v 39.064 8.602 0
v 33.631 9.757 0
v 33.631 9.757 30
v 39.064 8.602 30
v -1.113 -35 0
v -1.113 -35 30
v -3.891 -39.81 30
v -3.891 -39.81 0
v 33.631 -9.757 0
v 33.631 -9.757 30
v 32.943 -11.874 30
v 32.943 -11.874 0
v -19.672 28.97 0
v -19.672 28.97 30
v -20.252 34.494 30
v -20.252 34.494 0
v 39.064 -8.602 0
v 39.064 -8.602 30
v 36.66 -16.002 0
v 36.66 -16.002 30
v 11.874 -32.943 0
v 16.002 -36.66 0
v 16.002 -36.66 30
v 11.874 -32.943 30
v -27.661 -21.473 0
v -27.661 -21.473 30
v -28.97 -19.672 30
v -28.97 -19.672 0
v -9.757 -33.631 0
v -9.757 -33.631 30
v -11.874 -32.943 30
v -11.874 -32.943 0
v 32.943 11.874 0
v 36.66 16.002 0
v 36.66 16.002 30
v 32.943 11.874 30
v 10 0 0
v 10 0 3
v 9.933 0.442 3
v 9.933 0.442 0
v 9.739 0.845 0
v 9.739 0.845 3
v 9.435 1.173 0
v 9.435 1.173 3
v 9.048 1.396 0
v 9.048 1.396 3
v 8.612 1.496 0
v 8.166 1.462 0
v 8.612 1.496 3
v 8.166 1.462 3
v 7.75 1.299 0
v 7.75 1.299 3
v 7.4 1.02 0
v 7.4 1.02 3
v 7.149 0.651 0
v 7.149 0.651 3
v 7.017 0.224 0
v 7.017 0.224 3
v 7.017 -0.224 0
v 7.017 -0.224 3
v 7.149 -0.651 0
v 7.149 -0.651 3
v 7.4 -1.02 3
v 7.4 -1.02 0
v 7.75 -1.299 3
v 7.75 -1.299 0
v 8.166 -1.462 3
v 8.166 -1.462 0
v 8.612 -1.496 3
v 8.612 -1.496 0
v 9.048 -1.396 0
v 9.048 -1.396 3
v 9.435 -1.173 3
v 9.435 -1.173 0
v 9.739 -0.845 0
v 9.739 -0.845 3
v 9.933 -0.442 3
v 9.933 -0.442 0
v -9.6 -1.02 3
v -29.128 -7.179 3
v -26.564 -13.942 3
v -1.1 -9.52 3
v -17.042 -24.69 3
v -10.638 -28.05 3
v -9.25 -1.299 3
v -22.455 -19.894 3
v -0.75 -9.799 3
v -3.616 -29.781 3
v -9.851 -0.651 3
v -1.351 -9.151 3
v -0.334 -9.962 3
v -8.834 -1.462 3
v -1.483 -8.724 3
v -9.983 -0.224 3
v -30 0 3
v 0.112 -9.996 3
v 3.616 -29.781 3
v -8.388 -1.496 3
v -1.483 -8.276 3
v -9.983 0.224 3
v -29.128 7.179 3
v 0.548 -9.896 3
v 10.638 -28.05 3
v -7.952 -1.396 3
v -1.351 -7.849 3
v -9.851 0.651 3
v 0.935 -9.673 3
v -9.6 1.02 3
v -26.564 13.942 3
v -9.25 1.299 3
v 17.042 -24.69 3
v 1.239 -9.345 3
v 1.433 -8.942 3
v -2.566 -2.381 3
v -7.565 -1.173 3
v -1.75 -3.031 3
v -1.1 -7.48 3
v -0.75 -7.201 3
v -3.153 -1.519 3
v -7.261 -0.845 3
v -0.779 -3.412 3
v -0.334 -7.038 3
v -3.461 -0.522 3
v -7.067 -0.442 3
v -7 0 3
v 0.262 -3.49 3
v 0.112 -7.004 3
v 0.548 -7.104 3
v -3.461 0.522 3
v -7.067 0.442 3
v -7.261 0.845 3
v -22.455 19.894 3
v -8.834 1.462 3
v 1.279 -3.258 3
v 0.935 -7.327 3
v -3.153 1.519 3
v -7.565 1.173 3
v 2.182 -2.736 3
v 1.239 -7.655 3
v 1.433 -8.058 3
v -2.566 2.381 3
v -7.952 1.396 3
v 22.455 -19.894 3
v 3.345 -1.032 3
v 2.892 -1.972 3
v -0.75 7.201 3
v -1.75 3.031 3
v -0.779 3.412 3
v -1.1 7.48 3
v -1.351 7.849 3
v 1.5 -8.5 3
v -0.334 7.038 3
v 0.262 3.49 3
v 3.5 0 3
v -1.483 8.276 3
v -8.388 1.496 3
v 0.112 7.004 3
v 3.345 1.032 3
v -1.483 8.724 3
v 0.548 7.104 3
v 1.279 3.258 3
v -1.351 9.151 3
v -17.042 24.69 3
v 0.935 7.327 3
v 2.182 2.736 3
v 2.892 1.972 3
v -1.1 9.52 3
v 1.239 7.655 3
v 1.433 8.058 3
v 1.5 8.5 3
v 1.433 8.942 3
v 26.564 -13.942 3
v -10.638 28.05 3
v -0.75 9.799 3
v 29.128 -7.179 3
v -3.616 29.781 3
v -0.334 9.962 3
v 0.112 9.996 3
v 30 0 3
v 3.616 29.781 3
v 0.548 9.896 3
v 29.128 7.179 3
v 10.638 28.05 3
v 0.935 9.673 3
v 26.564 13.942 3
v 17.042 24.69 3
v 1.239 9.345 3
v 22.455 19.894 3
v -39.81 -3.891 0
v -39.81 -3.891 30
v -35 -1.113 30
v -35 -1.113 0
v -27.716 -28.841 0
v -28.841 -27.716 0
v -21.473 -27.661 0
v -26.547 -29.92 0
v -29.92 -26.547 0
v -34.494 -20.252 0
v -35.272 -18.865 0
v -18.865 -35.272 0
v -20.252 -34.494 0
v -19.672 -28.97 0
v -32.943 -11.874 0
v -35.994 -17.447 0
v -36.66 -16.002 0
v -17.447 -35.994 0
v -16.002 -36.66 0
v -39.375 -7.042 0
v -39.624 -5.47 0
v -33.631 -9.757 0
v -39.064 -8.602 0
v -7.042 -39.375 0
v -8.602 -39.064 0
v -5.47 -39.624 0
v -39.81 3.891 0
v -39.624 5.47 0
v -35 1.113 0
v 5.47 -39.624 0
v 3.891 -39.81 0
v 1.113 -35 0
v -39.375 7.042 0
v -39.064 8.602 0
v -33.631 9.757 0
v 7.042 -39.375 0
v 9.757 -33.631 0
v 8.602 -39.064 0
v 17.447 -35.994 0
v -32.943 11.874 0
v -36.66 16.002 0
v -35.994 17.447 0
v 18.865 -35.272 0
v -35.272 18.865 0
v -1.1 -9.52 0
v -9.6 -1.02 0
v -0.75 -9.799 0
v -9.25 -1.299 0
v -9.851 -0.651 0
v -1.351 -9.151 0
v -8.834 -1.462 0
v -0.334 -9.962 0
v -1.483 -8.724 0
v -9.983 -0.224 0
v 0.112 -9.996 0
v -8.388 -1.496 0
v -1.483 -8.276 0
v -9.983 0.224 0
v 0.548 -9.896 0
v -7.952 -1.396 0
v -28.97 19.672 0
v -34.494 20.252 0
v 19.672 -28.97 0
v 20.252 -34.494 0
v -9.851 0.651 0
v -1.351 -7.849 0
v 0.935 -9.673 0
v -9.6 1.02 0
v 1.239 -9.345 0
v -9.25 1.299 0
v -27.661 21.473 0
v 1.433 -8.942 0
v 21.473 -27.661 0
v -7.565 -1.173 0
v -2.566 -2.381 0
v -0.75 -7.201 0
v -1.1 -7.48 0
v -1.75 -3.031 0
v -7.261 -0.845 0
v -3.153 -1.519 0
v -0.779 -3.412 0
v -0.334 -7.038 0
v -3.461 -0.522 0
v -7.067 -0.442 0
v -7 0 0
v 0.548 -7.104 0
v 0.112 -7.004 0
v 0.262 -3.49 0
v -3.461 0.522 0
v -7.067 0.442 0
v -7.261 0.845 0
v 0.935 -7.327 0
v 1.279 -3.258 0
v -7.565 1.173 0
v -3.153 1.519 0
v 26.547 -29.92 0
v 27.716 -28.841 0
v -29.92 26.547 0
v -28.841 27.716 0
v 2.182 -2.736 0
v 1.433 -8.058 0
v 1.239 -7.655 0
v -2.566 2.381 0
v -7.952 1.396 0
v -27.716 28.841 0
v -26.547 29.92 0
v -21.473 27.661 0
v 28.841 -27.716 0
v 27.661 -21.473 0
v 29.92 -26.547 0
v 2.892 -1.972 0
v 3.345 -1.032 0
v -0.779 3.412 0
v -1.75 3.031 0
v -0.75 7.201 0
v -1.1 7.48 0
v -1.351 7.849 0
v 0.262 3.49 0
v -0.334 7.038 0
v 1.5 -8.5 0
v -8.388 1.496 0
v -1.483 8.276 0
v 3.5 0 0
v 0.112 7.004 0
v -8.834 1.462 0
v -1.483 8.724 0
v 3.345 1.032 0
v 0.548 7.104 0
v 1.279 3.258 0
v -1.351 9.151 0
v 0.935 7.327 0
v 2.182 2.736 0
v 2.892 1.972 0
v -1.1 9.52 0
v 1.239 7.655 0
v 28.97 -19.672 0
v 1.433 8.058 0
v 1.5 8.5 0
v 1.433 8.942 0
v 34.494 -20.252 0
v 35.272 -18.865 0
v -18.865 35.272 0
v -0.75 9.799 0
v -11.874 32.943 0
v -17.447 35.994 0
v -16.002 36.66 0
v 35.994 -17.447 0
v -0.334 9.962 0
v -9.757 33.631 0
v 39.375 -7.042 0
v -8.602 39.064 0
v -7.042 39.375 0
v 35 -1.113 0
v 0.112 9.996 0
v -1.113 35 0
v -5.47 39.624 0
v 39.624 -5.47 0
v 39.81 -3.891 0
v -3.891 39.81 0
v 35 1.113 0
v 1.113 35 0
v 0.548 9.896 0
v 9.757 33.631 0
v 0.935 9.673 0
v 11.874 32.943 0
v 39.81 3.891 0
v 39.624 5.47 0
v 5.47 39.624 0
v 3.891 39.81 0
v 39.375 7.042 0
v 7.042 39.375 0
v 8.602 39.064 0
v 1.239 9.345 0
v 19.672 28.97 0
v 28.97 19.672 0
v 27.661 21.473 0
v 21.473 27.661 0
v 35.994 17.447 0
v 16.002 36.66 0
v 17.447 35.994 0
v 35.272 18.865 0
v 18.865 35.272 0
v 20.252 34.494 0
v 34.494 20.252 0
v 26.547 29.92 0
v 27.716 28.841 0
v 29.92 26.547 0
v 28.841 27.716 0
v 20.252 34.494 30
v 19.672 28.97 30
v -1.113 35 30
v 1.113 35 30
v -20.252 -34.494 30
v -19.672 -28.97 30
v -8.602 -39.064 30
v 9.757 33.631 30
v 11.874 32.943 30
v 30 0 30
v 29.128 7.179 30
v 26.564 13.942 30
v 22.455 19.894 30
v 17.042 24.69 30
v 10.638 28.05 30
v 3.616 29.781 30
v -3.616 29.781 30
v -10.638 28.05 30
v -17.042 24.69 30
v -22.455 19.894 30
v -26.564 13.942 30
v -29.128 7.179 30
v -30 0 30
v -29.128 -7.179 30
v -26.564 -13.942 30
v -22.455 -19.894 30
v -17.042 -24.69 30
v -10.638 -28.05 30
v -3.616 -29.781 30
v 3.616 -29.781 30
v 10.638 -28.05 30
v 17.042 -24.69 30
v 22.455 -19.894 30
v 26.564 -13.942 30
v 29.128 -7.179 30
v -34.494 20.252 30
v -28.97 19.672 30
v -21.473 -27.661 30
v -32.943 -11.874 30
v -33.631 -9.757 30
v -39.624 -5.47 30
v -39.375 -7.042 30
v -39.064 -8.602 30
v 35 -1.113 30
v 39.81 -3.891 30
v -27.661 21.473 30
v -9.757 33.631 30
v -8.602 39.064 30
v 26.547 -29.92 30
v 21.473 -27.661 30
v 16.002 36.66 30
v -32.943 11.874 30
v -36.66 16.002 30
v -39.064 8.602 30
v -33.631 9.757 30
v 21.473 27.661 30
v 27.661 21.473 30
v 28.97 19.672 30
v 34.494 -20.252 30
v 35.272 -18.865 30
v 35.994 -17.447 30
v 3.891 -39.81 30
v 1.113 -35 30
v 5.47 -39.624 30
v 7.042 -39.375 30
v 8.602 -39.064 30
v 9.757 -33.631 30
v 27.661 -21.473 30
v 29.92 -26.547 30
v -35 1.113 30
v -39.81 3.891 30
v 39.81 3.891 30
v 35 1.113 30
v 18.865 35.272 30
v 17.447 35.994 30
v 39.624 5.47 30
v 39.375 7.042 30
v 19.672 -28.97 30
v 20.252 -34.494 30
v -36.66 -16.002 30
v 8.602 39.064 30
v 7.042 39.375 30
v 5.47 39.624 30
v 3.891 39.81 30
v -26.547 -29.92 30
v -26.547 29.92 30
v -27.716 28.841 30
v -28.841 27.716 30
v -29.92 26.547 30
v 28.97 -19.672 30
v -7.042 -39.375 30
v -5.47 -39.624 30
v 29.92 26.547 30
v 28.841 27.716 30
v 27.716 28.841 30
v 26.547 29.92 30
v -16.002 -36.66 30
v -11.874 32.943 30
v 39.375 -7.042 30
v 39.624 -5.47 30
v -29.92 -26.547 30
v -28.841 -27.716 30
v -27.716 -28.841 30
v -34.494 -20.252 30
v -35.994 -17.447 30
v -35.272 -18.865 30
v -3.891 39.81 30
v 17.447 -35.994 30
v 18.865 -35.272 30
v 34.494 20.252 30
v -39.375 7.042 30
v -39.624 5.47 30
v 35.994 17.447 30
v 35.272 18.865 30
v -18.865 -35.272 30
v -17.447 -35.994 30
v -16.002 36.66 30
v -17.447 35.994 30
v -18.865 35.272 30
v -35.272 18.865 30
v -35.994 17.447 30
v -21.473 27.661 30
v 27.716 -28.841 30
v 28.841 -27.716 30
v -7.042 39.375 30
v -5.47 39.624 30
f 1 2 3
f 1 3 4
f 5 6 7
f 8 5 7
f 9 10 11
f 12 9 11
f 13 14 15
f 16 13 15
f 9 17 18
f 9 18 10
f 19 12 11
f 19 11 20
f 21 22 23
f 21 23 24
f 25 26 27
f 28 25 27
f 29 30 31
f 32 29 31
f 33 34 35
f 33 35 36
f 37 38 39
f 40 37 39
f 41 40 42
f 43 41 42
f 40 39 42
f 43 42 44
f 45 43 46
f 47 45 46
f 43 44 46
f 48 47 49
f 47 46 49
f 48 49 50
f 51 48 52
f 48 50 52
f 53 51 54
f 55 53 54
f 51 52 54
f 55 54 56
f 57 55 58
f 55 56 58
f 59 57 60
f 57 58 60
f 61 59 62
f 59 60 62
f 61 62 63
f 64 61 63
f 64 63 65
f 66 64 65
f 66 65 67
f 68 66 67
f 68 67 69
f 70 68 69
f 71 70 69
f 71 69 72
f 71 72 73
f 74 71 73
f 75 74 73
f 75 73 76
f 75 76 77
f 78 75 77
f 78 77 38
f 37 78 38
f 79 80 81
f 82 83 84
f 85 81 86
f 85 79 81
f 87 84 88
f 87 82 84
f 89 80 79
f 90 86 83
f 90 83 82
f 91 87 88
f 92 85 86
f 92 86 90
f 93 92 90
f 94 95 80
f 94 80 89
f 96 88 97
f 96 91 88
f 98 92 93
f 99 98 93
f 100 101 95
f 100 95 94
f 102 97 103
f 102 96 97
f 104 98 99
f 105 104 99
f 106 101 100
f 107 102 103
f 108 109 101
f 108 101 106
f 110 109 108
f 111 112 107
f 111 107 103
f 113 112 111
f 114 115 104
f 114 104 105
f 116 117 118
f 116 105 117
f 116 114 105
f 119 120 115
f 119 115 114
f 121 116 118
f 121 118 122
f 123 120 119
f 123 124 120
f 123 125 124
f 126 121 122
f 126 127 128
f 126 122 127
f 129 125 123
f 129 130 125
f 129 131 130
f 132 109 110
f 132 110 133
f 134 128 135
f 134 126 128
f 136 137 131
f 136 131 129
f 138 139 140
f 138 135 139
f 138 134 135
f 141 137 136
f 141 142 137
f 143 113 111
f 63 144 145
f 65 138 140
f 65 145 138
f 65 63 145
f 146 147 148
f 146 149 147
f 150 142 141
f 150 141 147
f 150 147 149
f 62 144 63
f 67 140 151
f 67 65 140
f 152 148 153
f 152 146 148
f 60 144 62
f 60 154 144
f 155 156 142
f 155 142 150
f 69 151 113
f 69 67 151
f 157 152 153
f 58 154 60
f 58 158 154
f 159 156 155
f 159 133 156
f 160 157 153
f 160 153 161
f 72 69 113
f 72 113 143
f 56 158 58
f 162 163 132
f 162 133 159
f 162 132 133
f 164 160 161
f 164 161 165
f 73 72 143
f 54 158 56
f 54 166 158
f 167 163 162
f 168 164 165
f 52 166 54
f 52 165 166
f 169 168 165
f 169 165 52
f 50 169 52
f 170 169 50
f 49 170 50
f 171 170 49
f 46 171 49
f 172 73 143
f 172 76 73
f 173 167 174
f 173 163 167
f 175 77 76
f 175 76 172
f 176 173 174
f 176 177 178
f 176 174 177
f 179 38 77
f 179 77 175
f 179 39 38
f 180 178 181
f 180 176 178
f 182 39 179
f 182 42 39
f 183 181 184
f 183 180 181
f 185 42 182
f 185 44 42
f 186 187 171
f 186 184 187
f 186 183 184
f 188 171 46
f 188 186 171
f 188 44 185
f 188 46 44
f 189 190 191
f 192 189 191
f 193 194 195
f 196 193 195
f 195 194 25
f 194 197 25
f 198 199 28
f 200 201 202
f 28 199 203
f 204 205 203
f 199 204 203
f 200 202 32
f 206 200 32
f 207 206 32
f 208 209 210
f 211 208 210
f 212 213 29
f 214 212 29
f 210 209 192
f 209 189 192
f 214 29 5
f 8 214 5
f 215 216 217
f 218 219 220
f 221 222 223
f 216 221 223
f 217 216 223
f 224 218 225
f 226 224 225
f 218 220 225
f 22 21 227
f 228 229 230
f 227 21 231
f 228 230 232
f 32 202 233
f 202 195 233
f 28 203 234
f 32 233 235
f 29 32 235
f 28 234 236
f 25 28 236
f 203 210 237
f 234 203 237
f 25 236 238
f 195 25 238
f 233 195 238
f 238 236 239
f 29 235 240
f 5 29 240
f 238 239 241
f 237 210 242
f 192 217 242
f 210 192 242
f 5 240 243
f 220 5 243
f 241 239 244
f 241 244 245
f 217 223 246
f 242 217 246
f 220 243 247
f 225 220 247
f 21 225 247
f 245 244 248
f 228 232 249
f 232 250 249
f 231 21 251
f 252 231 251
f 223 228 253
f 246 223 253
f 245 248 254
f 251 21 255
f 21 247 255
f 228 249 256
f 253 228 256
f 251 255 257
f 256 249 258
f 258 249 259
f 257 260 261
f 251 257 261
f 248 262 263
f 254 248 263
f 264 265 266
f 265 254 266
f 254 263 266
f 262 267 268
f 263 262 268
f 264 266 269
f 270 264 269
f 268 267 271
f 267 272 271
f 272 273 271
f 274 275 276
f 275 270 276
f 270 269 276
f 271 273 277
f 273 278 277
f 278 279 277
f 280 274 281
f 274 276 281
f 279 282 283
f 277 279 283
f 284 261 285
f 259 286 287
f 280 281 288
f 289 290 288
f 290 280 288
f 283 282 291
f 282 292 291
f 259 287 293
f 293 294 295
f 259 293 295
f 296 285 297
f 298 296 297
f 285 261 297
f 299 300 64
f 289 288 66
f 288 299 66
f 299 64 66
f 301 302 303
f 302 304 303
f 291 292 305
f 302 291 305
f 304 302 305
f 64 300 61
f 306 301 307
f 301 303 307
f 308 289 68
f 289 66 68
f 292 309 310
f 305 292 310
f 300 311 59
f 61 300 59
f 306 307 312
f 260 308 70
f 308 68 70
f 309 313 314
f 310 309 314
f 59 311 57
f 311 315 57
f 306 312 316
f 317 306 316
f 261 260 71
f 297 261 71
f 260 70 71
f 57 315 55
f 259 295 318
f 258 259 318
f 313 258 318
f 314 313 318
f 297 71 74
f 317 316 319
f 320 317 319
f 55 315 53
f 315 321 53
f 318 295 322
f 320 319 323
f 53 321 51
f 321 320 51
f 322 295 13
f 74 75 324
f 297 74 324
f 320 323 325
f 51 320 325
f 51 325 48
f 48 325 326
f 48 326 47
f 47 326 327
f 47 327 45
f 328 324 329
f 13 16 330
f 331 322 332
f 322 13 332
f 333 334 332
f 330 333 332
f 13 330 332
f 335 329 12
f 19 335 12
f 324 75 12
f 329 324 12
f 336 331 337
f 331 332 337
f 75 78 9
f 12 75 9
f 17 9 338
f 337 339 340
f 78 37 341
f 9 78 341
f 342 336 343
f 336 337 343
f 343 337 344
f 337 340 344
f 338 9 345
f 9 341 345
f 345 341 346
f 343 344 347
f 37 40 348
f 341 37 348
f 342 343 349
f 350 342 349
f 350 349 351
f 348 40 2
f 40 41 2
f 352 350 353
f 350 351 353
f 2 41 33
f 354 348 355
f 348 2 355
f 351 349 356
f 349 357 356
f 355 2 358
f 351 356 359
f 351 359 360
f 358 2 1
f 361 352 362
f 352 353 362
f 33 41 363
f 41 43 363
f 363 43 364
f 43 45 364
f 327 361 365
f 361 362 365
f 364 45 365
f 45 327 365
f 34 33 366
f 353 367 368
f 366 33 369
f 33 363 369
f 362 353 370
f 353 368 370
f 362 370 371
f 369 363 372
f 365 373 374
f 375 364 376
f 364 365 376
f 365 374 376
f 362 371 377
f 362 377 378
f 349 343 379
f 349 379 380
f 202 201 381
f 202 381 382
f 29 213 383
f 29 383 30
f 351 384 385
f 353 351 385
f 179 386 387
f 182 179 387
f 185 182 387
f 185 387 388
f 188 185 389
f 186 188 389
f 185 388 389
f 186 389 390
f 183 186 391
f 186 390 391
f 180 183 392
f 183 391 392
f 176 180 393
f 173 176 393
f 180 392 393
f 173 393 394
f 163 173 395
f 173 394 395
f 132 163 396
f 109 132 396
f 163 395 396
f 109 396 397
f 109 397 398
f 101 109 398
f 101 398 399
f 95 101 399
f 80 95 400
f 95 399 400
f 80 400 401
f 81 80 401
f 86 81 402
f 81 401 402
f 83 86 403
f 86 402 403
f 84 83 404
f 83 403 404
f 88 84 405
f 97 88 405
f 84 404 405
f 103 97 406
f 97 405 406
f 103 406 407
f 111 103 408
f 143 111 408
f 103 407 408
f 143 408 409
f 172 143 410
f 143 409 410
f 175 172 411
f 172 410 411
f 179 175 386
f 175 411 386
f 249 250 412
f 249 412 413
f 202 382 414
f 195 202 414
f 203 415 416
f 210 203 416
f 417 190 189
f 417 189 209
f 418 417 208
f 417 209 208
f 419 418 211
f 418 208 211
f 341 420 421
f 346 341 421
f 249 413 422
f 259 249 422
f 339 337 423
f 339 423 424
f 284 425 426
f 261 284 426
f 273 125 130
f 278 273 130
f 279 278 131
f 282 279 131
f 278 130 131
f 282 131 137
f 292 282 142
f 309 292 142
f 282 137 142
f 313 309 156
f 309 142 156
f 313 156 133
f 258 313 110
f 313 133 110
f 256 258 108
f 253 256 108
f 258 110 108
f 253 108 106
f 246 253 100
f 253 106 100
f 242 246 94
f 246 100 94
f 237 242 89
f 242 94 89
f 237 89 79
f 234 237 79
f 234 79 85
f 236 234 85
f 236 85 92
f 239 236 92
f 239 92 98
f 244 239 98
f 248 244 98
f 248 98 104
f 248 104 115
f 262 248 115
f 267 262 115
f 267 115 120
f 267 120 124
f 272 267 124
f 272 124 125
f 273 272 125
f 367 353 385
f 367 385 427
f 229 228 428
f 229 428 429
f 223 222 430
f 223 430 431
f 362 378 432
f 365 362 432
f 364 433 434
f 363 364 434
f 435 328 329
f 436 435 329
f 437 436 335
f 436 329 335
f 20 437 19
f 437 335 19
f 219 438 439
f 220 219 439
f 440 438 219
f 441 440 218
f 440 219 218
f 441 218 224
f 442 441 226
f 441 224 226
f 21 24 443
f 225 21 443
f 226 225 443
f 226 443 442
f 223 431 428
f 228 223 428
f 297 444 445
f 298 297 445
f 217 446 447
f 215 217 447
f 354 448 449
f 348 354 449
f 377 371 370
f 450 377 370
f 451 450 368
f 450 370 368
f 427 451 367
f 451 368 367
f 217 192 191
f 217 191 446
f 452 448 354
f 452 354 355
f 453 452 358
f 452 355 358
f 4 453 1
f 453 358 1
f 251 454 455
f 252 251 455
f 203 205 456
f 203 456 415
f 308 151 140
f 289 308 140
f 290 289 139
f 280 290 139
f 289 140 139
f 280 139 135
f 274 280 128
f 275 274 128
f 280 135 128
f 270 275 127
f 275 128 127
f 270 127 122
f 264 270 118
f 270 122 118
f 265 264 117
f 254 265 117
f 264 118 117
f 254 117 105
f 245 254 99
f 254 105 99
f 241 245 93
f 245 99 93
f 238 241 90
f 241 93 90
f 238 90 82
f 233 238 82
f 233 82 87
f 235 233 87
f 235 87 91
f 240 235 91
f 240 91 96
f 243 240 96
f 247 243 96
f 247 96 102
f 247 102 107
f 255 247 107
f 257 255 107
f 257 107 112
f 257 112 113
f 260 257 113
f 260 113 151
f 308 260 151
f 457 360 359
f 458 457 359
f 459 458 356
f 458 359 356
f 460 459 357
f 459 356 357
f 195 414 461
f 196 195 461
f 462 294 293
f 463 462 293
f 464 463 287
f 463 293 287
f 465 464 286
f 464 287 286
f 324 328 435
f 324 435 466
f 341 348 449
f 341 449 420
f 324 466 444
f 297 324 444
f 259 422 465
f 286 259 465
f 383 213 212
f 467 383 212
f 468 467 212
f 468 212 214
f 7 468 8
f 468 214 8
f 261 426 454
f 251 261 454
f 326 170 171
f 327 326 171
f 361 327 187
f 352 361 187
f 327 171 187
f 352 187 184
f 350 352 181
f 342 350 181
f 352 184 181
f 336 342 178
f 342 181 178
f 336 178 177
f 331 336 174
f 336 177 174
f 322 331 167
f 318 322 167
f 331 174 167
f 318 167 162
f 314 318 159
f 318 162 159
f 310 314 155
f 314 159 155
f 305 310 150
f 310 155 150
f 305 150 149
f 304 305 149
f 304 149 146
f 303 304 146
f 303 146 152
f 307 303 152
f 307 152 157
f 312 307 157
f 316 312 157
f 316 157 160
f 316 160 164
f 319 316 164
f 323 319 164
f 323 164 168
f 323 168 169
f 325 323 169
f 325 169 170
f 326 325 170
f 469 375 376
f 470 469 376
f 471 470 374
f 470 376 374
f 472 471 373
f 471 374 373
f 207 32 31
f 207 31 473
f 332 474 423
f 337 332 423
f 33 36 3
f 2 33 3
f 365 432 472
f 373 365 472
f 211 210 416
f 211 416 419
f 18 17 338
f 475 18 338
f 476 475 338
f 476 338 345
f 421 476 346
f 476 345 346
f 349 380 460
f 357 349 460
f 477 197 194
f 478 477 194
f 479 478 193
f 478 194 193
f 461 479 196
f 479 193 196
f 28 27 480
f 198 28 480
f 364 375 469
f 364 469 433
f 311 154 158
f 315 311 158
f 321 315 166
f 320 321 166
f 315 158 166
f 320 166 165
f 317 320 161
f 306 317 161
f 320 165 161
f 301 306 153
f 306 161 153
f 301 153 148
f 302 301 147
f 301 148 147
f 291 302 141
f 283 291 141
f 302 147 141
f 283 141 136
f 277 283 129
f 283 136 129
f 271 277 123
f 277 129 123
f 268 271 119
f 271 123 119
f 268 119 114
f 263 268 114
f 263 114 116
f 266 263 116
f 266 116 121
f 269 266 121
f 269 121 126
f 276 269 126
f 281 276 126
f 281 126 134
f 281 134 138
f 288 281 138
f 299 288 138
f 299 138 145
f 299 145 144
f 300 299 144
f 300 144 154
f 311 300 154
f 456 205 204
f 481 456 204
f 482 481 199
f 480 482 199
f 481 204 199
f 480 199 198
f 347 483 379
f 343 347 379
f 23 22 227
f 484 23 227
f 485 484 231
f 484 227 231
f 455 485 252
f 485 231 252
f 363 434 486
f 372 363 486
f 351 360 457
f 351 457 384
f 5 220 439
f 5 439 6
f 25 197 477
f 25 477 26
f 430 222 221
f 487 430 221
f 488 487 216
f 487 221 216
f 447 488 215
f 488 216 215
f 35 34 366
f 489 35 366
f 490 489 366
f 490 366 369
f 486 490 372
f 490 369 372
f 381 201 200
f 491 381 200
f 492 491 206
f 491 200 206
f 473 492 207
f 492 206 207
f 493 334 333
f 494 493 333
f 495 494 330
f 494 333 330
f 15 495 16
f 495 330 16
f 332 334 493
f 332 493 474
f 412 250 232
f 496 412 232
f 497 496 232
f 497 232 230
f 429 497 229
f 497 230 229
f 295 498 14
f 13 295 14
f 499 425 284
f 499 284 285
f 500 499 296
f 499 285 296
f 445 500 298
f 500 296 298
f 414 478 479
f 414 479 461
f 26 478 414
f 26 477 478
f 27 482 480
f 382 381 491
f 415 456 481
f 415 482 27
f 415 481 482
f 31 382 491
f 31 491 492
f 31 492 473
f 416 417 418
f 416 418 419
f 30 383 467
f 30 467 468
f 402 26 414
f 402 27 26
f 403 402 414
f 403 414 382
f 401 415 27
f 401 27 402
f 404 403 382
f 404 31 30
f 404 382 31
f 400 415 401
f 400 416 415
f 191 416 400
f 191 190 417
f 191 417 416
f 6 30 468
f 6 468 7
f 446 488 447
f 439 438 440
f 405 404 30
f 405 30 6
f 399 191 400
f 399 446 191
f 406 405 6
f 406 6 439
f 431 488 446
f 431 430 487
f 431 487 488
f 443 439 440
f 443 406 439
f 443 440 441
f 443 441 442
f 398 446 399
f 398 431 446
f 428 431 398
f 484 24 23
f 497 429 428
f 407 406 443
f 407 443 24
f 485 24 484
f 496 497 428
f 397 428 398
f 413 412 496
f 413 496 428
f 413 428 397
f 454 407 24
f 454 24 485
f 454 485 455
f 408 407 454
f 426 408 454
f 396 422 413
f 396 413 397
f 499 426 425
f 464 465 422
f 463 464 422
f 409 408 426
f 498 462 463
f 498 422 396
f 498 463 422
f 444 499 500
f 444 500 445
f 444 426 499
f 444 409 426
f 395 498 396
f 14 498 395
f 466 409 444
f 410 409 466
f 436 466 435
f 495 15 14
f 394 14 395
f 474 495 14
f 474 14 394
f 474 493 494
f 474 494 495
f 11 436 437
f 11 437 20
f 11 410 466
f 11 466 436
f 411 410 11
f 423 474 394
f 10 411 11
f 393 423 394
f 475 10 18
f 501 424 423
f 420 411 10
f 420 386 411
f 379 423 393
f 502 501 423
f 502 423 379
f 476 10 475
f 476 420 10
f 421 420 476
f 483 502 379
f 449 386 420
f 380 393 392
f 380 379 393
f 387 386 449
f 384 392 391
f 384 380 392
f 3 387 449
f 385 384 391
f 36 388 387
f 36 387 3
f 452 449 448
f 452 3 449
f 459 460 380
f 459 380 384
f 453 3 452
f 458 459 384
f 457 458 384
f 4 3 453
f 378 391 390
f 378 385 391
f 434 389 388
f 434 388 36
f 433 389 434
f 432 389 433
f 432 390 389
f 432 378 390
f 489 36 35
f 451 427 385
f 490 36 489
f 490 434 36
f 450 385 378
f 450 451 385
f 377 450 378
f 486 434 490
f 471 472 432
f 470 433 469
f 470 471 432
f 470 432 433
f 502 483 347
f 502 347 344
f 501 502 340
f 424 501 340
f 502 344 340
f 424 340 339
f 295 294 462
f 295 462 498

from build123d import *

# Parameters (mm, degrees)
SKETCH1_R           = 40
BOSS_EXTRUDE1_DEPTH = 30
CUT_EXTRUDE1_DEPTH  = 30
SKETCH3_R           = 30
CUT_EXTRUDE2_DEPTH  = 27
SKETCH4_R           = 1.5
SKETCH4_R_2         = 3.5
CUT_EXTRUDE3_DEPTH  = 27


with BuildPart() as part:
    # Sketch1 → Boss-Extrude1 (new body)
    with BuildSketch(Plane.XY):
        Circle(SKETCH1_R)
    extrude(amount=BOSS_EXTRUDE1_DEPTH)

    # Sketch2 → Cut-Extrude1 (cut)
    with BuildSketch(Plane.XY.offset(30)):
        Polygon((4, 40), (-4, 40), (-1.113248654, 35), (1.113248654, 35), align=None)
        Polygon((11.87435719, 32.942965317), (16.16490584, 36.806192674), (8.55645371, 39.278328629), (9.756832416, 33.630990823), align=None)
        Polygon((21.47312091, 27.661243662), (26.747478069, 30.009538766), (20.275342114, 34.711820784), (19.67184675, 28.969945944), align=None)
        Polygon((28.969945944, 19.67184675), (34.711820784, 20.275342114), (30.009538766, 26.747478069), (27.661243662, 21.47312091), align=None)
        Polygon((33.630990823, 9.756832416), (39.278328629, 8.55645371), (36.806192674, 16.16490584), (32.942965317, 11.87435719), align=None)
        Polygon((35, -1.113248654), (40, -4), (40, 4), (35, 1.113248654), align=None)
        Polygon((32.942965317, -11.87435719), (36.806192674, -16.16490584), (39.278328629, -8.55645371), (33.630990823, -9.756832416), align=None)
        Polygon((27.661243662, -21.47312091), (30.009538766, -26.747478069), (34.711820784, -20.275342114), (28.969945944, -19.67184675), align=None)
        Polygon((19.67184675, -28.969945944), (20.275342114, -34.711820784), (26.747478069, -30.009538766), (21.47312091, -27.661243662), align=None)
        Polygon((9.756832416, -33.630990823), (8.55645371, -39.278328629), (16.16490584, -36.806192674), (11.87435719, -32.942965317), align=None)
        Polygon((-1.113248654, -35), (-4, -40), (4, -40), (1.113248654, -35), align=None)
        Polygon((-11.87435719, -32.942965317), (-16.16490584, -36.806192674), (-8.55645371, -39.278328629), (-9.756832416, -33.630990823), align=None)
        Polygon((-21.47312091, -27.661243662), (-26.747478069, -30.009538766), (-20.275342114, -34.711820784), (-19.67184675, -28.969945944), align=None)
        Polygon((-28.969945944, -19.67184675), (-34.711820784, -20.275342114), (-30.009538766, -26.747478069), (-27.661243662, -21.47312091), align=None)
        Polygon((-33.630990823, -9.756832416), (-39.278328629, -8.55645371), (-36.806192674, -16.16490584), (-32.942965317, -11.87435719), align=None)
        Polygon((-35, 1.113248654), (-40, 4), (-40, -4), (-35, -1.113248654), align=None)
        Polygon((-32.942965317, 11.87435719), (-36.806192674, 16.16490584), (-39.278328629, 8.55645371), (-33.630990823, 9.756832416), align=None)
        Polygon((-27.661243662, 21.47312091), (-30.009538766, 26.747478069), (-34.711820784, 20.275342114), (-28.969945944, 19.67184675), align=None)
        Polygon((-19.67184675, 28.969945944), (-20.275342114, 34.711820784), (-26.747478069, 30.009538766), (-21.47312091, 27.661243662), align=None)
        Polygon((-9.756832416, 33.630990823), (-8.55645371, 39.278328629), (-16.16490584, 36.806192674), (-11.87435719, 32.942965317), align=None)
    extrude(amount=-CUT_EXTRUDE1_DEPTH, mode=Mode.SUBTRACT)

    # Sketch3 → Cut-Extrude2 (cut)
    with BuildSketch(Plane.XY.offset(30)):
        Circle(SKETCH3_R)
    extrude(amount=-CUT_EXTRUDE2_DEPTH, mode=Mode.SUBTRACT)

    # Sketch4 → Cut-Extrude3 (cut)
    with BuildSketch(Plane.XY.offset(3)):
        with Locations((8.5, 0)):
            Circle(SKETCH4_R)
        with Locations((-8.5, 0)):
            Circle(SKETCH4_R)
        with Locations((0, -8.5)):
            Circle(SKETCH4_R)
        with Locations((0, 8.5)):
            Circle(SKETCH4_R)
        Circle(SKETCH4_R_2)
    extrude(amount=-CUT_EXTRUDE3_DEPTH, mode=Mode.SUBTRACT)


solid = part.part
